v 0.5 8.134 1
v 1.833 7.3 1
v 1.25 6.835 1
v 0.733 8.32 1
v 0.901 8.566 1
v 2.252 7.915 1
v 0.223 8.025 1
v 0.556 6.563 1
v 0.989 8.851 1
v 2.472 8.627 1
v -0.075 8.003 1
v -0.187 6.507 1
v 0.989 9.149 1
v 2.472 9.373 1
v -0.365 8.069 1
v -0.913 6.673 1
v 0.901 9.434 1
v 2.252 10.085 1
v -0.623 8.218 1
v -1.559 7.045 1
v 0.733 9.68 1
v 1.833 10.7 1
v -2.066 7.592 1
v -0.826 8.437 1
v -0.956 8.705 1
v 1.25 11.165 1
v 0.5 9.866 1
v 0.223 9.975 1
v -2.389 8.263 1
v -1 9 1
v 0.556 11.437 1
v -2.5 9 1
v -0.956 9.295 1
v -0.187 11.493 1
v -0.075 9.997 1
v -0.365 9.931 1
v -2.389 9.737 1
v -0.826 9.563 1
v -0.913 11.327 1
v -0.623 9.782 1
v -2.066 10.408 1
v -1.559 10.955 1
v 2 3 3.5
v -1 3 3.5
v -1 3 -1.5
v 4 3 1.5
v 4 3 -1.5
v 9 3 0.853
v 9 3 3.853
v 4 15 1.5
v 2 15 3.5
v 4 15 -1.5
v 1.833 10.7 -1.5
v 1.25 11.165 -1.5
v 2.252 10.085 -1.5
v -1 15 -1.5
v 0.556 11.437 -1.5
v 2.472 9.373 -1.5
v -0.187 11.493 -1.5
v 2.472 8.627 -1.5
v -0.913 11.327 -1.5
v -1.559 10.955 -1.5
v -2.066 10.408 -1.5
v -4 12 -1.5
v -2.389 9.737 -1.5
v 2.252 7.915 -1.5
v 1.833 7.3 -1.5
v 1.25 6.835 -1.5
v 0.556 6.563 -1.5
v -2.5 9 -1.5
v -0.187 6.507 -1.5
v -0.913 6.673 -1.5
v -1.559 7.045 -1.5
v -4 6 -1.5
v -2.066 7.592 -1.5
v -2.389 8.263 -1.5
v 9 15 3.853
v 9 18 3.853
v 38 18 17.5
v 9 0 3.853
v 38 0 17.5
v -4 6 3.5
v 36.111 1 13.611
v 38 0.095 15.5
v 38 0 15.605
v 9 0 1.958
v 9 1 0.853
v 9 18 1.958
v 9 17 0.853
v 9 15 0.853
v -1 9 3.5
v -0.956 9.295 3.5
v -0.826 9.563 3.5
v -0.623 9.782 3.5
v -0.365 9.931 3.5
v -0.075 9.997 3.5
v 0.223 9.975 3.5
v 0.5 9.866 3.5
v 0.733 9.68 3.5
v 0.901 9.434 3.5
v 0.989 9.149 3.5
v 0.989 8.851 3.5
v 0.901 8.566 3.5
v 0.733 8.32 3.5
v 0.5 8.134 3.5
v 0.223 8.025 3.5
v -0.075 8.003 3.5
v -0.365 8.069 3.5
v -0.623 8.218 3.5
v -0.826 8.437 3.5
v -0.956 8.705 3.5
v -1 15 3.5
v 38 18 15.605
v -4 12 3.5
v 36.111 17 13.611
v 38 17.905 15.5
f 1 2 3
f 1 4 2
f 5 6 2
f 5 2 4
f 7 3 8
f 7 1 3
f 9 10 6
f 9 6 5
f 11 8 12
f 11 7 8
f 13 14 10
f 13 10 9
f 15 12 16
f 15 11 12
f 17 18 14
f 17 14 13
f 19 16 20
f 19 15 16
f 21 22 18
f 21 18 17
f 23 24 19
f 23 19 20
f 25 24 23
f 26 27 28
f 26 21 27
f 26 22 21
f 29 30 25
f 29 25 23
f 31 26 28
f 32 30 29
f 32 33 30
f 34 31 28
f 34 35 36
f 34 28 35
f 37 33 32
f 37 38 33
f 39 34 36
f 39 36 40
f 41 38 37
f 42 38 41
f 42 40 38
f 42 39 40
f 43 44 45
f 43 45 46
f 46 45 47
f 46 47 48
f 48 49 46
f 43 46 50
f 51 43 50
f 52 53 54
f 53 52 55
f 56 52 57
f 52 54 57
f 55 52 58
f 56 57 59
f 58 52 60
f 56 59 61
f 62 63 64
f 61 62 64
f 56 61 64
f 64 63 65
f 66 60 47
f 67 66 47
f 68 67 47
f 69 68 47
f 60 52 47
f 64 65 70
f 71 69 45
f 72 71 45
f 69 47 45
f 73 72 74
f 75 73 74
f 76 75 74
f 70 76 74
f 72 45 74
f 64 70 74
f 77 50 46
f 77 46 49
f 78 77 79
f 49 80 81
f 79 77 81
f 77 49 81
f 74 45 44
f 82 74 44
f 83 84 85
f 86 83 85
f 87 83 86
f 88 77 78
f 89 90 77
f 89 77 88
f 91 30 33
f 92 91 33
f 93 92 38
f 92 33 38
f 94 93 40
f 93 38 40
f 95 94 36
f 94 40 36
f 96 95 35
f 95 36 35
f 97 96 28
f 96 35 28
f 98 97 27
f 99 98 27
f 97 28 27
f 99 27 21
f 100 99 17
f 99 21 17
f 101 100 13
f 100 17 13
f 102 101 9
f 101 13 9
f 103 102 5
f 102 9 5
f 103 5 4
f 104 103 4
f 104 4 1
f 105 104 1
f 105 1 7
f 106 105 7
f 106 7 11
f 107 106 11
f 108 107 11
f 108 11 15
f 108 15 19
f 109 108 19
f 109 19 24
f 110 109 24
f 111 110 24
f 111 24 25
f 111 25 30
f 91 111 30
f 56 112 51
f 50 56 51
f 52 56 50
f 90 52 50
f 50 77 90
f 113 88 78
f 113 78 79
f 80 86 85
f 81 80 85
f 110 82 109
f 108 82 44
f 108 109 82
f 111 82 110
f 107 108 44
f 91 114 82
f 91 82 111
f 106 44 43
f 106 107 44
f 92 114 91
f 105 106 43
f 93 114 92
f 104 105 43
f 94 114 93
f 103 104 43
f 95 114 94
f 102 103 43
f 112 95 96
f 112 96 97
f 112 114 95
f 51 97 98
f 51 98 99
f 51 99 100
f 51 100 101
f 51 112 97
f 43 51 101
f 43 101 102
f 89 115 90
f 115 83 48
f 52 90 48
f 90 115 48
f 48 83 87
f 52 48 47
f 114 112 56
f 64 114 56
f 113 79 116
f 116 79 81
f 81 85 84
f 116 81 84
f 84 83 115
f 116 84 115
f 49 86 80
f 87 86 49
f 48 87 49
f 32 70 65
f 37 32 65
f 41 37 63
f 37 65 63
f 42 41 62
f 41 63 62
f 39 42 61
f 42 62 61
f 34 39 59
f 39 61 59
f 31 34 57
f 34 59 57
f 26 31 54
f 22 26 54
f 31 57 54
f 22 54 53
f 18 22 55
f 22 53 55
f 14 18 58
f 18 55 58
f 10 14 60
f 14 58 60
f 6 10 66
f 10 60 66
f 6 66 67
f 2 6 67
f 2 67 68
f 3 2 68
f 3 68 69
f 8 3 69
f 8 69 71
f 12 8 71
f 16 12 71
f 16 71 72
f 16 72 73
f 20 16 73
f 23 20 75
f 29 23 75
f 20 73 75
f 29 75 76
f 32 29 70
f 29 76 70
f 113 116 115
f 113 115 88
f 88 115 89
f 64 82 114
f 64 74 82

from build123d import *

# Parameters (mm, degrees)
SALIENTE_EXTRUIR1_DEPTH = 18
CROQUIS2_R              = 2.5
CORTAR_EXTRUIR1_DEPTH   = 2.5
CROQUIS3_W              = 13
CROQUIS3_H              = 3
CORTAR_EXTRUIR2_DEPTH   = 47.14108798
CHAFL_N1_SIZE           = 1
CHAFL_N2_SIZE           = 1
CHAFL_N2_SIZE2          = 2.087588248
CROQUIS4_W              = 8
CROQUIS4_H              = 12
SALIENTE_EXTRUIR2_DEPTH = 2
CROQUIS5_R              = 1
CORTAR_EXTRUIR3_DEPTH   = 46.169126624
CHAFL_N3_SIZE           = 3
CHAFL_N4_SIZE           = 2


with BuildPart() as part:
    # Croquis1 → Saliente-Extruir1 (new body)
    with BuildSketch(Plane(origin=(0, 0, 0), x_dir=(1, 0, 0), z_dir=(0, 1, 0))):
        Polygon((4, -1.5), (38, -17.5), (38, -14.5), (4, 1.5), (-4, 1.5), (-4, -1.5), align=None)
    extrude(amount=SALIENTE_EXTRUIR1_DEPTH)

    # Croquis2 → Cortar-Extruir1 (cut)
    with BuildSketch(Plane(origin=(0, 0, -1.5), x_dir=(-1, 0, 0), z_dir=(0, 0, -1))):
        with Locations((0, 9)):
            Circle(CROQUIS2_R)
    extrude(amount=-CORTAR_EXTRUIR1_DEPTH, mode=Mode.SUBTRACT)

    # Croquis3 → Cortar-Extruir2 (cut, through all)
    with BuildSketch(Plane(origin=(0, 0, -1.5), x_dir=(-1, 0, 0), z_dir=(0, 0, -1))):
        with Locations((-2.5, 16.5)):
            Rectangle(CROQUIS3_W, CROQUIS3_H)
        with Locations((-2.5, 1.5)):
            Rectangle(CROQUIS3_W, CROQUIS3_H)
    extrude(amount=-CORTAR_EXTRUIR2_DEPTH, mode=Mode.SUBTRACT)

    # Chaflán1
    chafl_n1_edges = [part.edges().sort_by_distance(p)[0] for p in [
        (23.5, 18, 7.676470588),
        (23.5, 0, 7.676470588),
    ]]
    chamfer(chafl_n1_edges, length=CHAFL_N1_SIZE)

    # Chaflán2
    chafl_n2_edges = [part.edges().sort_by_distance(p)[0] for p in [
        (38, 9, 14.5),
    ]]
    chafl_n2_side = [part.faces().sort_by_distance(p)[0] for p in [
        (38, 9, 16.023643901),
    ]]
    chamfer(chafl_n2_edges, length=CHAFL_N2_SIZE, length2=CHAFL_N2_SIZE2, reference=chafl_n2_side[0])

    # Croquis4 → Saliente-Extruir2 (add)
    with BuildSketch(Plane.XY.offset(1.5)):
        with Locations((0, 9)):
            Rectangle(CROQUIS4_W, CROQUIS4_H)
    extrude(amount=SALIENTE_EXTRUIR2_DEPTH)

    # Croquis5 → Cortar-Extruir3 (cut, through all)
    with BuildSketch(Plane(origin=(0, 0, 1), x_dir=(-1, 0, 0), z_dir=(0, 0, -1))):
        with Locations((0, 9)):
            Circle(CROQUIS5_R)
    extrude(amount=-CORTAR_EXTRUIR3_DEPTH, mode=Mode.SUBTRACT)

    # Chaflán3
    chafl_n3_edges = [part.edges().sort_by_distance(p)[0] for p in [
        (-4, 15, 1),
        (-4, 3, 1),
    ]]
    chamfer(chafl_n3_edges, length=CHAFL_N3_SIZE)

    # Chaflán4
    chafl_n4_edges = [part.edges().sort_by_distance(p)[0] for p in [
        (4, 9, 3.5),
    ]]
    chamfer(chafl_n4_edges, length=CHAFL_N4_SIZE - 0.0001)  # a hair under: the kernel refuses the full size


solid = part.part
